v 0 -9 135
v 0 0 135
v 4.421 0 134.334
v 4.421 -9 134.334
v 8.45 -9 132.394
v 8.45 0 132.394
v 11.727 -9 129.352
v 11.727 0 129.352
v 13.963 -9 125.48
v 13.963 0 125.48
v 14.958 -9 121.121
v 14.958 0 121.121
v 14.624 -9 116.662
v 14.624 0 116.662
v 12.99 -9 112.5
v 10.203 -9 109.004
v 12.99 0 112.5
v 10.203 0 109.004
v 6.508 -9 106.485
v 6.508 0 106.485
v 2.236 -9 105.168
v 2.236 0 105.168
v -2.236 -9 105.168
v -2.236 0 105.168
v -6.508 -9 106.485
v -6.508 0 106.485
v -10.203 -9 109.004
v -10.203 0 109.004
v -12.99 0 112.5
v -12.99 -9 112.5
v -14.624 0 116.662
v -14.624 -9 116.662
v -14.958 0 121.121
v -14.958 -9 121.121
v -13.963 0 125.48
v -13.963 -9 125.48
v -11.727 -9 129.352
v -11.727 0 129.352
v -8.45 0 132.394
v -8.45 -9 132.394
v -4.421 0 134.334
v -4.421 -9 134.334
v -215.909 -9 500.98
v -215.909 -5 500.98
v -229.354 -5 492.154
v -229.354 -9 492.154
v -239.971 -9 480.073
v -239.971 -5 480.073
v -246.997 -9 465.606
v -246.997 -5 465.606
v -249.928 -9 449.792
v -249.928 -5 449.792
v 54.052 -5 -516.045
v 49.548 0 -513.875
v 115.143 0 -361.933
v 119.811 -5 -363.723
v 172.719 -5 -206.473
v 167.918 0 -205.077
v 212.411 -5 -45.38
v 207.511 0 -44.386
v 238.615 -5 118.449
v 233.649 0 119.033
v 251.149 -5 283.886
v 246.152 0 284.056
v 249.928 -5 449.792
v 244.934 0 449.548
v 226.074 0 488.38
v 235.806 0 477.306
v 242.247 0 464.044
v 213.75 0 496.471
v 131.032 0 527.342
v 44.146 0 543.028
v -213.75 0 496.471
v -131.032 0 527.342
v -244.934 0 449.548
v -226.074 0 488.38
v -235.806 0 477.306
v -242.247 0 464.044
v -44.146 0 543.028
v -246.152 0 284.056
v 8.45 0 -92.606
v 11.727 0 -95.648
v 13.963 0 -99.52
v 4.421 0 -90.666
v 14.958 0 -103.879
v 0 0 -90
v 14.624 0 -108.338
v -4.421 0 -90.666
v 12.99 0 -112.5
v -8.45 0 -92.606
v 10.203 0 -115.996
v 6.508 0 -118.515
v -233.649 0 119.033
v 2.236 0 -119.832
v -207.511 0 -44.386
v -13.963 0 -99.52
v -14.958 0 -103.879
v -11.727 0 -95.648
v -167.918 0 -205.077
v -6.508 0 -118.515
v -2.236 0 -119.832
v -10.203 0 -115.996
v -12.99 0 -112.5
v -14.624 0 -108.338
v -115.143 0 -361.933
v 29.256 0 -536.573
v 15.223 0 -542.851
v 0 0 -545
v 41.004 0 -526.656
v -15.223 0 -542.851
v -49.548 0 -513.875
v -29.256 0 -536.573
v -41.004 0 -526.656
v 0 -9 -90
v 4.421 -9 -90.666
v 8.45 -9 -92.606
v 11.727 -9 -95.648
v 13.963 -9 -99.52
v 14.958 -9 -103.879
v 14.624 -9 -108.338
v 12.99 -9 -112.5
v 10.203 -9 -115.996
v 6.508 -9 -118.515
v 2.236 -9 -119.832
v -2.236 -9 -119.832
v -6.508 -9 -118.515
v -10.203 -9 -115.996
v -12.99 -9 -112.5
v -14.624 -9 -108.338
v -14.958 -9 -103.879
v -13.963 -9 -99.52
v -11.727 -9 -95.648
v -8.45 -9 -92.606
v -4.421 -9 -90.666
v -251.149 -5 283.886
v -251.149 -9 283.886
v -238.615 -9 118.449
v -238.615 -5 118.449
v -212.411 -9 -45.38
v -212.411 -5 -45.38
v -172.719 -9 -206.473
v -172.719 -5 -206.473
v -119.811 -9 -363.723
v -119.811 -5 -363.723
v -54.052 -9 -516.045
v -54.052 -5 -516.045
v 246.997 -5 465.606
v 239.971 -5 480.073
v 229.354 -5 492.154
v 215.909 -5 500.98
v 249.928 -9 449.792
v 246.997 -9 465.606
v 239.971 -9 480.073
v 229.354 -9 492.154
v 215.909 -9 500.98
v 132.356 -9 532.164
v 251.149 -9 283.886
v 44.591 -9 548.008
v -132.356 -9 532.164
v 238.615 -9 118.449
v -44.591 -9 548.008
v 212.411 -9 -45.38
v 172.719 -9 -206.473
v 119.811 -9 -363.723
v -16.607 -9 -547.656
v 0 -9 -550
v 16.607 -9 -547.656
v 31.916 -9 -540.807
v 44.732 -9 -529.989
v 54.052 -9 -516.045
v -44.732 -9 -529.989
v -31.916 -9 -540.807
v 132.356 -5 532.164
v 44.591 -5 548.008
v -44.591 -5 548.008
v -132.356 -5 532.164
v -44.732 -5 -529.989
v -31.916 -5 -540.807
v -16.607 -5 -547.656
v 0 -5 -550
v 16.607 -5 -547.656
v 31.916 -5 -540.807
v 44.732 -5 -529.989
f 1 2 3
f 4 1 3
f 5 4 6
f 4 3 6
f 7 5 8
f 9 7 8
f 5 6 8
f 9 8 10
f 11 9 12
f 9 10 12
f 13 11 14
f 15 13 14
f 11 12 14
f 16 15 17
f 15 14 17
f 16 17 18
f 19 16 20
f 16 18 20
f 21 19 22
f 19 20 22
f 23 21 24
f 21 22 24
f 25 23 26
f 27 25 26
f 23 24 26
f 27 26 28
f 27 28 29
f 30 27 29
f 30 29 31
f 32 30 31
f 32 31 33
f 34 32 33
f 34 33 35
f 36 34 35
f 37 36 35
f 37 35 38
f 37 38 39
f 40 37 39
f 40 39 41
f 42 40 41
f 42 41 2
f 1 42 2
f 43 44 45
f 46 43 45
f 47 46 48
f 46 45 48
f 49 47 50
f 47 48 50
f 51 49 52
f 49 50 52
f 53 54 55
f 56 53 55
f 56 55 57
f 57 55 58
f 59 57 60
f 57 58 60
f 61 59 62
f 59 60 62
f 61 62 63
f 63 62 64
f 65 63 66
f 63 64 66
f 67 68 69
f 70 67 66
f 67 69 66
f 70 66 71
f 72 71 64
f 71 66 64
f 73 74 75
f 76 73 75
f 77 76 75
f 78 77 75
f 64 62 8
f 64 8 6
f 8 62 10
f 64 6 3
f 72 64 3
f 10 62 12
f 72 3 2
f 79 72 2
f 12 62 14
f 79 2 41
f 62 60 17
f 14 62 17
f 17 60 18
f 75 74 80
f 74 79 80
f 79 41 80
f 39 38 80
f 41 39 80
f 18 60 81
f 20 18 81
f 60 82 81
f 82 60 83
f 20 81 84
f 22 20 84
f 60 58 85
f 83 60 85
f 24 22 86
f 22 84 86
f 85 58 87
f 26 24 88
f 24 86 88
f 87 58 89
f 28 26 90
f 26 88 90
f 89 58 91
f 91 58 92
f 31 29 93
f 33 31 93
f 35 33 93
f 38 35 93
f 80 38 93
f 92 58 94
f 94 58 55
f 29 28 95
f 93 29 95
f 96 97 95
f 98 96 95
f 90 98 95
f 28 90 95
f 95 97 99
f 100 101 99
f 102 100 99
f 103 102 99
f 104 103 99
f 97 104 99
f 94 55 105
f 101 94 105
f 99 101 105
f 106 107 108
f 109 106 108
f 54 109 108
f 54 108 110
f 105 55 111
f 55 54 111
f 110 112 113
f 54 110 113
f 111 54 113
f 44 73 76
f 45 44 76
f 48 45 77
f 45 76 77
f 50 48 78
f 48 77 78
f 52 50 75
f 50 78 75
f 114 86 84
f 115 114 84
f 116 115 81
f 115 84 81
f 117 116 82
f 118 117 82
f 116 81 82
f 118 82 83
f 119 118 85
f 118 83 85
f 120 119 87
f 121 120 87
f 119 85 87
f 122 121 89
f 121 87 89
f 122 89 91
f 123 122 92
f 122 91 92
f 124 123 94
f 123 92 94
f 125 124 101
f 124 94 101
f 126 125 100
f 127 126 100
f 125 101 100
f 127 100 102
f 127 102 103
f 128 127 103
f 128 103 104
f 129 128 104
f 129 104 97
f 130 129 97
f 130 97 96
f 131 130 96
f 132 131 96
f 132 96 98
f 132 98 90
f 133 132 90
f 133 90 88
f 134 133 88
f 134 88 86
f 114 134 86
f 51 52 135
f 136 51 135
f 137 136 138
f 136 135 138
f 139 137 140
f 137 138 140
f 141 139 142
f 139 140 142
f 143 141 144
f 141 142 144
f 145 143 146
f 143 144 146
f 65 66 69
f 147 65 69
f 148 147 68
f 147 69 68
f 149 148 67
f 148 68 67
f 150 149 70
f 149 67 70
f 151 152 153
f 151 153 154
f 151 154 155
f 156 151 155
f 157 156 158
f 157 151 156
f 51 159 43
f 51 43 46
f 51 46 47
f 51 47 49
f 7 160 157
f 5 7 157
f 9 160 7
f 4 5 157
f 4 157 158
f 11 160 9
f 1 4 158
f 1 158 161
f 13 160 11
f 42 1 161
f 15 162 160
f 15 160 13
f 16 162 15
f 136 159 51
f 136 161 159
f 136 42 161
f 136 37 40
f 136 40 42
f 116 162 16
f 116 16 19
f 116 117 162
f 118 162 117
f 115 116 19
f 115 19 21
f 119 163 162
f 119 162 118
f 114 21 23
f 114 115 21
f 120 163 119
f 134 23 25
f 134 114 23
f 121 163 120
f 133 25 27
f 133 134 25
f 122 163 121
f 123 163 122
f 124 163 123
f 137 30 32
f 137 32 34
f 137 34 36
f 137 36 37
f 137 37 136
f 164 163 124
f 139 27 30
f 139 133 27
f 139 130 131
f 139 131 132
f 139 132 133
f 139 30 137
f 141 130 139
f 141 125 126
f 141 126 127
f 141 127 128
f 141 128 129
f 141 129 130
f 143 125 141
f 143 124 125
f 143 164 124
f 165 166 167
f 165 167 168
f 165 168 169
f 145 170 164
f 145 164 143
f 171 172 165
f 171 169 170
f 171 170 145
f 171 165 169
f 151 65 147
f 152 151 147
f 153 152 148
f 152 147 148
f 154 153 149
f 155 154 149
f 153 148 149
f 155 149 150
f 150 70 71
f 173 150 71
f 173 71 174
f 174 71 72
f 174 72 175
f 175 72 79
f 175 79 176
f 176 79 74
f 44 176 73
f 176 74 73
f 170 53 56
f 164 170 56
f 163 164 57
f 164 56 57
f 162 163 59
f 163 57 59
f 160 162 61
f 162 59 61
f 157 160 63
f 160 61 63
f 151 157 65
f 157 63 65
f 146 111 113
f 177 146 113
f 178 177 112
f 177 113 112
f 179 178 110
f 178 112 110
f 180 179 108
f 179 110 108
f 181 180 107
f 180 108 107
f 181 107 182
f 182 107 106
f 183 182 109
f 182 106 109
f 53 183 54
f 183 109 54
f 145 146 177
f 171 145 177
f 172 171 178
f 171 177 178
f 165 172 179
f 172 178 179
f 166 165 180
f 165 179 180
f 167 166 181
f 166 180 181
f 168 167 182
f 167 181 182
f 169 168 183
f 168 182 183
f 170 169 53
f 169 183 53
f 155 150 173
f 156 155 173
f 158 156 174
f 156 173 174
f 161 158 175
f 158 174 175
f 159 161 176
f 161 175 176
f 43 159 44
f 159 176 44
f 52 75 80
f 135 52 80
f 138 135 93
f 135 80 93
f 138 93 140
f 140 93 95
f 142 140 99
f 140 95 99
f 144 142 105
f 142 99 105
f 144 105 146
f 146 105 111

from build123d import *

# Parameters (mm, degrees)
BOSS_EXTRUDE1_DEPTH = 9
CHAMFER1_SIZE       = 5
SKETCH2_R           = 15
CUT_EXTRUDE1_DEPTH  = 606.180442557


with BuildPart() as part:
    # Sketch1 → Boss-Extrude1 (new body)
    with BuildSketch(Plane(origin=(0, 0, 0), x_dir=(1, 0, 0), z_dir=(0, 1, 0))):
        with BuildLine():
            ThreePointArc((-54.052143505, 516.045456082), (0, 550), (54.052143505, 516.045456082))
            ThreePointArc((54.052143505, 516.045456082), (212.411110101, 45.380156813), (249.928432165, -449.792375526))
            ThreePointArc((249.928432165, -449.792375526), (239.970710869, -480.073057321), (215.909090909, -500.980337113))
            ThreePointArc((215.909090909, -500.980337113), (0, -550), (-215.909090909, -500.980337113))
            ThreePointArc((-215.909090909, -500.980337113), (-239.970710869, -480.073057321), (-249.928432165, -449.792375526))
            ThreePointArc((-249.928432165, -449.792375526), (-212.411110101, 45.380156813), (-54.052143505, 516.045456082))
        make_face()
    extrude(amount=-BOSS_EXTRUDE1_DEPTH)

    # Chamfer1
    chamfer1_edges = [part.edges().sort_by_distance(p)[0] for p in [
        (0, 0, -550),
        (212.411110101, 0, -45.380156813),
        (239.970710869, 0, 480.073057321),
        (0, 0, 550),
        (-239.970710869, 0, 480.073057321),
        (-212.411110101, 0, -45.380156813),
    ]]
    chamfer(chamfer1_edges, length=CHAMFER1_SIZE)

    # Sketch2 → Cut-Extrude1 (cut, through all)
    with BuildSketch(Plane(origin=(0, 0, 0), x_dir=(1, 0, 0), z_dir=(0, 1, 0))):
        with Locations(Location((0, 105, 0), (0, 0, 270))):
            Circle(SKETCH2_R)
        with Locations(Location((0, -120, 0), (0, 0, 270))):
            Circle(SKETCH2_R)
    extrude(amount=-CUT_EXTRUDE1_DEPTH, mode=Mode.SUBTRACT)


solid = part.part
